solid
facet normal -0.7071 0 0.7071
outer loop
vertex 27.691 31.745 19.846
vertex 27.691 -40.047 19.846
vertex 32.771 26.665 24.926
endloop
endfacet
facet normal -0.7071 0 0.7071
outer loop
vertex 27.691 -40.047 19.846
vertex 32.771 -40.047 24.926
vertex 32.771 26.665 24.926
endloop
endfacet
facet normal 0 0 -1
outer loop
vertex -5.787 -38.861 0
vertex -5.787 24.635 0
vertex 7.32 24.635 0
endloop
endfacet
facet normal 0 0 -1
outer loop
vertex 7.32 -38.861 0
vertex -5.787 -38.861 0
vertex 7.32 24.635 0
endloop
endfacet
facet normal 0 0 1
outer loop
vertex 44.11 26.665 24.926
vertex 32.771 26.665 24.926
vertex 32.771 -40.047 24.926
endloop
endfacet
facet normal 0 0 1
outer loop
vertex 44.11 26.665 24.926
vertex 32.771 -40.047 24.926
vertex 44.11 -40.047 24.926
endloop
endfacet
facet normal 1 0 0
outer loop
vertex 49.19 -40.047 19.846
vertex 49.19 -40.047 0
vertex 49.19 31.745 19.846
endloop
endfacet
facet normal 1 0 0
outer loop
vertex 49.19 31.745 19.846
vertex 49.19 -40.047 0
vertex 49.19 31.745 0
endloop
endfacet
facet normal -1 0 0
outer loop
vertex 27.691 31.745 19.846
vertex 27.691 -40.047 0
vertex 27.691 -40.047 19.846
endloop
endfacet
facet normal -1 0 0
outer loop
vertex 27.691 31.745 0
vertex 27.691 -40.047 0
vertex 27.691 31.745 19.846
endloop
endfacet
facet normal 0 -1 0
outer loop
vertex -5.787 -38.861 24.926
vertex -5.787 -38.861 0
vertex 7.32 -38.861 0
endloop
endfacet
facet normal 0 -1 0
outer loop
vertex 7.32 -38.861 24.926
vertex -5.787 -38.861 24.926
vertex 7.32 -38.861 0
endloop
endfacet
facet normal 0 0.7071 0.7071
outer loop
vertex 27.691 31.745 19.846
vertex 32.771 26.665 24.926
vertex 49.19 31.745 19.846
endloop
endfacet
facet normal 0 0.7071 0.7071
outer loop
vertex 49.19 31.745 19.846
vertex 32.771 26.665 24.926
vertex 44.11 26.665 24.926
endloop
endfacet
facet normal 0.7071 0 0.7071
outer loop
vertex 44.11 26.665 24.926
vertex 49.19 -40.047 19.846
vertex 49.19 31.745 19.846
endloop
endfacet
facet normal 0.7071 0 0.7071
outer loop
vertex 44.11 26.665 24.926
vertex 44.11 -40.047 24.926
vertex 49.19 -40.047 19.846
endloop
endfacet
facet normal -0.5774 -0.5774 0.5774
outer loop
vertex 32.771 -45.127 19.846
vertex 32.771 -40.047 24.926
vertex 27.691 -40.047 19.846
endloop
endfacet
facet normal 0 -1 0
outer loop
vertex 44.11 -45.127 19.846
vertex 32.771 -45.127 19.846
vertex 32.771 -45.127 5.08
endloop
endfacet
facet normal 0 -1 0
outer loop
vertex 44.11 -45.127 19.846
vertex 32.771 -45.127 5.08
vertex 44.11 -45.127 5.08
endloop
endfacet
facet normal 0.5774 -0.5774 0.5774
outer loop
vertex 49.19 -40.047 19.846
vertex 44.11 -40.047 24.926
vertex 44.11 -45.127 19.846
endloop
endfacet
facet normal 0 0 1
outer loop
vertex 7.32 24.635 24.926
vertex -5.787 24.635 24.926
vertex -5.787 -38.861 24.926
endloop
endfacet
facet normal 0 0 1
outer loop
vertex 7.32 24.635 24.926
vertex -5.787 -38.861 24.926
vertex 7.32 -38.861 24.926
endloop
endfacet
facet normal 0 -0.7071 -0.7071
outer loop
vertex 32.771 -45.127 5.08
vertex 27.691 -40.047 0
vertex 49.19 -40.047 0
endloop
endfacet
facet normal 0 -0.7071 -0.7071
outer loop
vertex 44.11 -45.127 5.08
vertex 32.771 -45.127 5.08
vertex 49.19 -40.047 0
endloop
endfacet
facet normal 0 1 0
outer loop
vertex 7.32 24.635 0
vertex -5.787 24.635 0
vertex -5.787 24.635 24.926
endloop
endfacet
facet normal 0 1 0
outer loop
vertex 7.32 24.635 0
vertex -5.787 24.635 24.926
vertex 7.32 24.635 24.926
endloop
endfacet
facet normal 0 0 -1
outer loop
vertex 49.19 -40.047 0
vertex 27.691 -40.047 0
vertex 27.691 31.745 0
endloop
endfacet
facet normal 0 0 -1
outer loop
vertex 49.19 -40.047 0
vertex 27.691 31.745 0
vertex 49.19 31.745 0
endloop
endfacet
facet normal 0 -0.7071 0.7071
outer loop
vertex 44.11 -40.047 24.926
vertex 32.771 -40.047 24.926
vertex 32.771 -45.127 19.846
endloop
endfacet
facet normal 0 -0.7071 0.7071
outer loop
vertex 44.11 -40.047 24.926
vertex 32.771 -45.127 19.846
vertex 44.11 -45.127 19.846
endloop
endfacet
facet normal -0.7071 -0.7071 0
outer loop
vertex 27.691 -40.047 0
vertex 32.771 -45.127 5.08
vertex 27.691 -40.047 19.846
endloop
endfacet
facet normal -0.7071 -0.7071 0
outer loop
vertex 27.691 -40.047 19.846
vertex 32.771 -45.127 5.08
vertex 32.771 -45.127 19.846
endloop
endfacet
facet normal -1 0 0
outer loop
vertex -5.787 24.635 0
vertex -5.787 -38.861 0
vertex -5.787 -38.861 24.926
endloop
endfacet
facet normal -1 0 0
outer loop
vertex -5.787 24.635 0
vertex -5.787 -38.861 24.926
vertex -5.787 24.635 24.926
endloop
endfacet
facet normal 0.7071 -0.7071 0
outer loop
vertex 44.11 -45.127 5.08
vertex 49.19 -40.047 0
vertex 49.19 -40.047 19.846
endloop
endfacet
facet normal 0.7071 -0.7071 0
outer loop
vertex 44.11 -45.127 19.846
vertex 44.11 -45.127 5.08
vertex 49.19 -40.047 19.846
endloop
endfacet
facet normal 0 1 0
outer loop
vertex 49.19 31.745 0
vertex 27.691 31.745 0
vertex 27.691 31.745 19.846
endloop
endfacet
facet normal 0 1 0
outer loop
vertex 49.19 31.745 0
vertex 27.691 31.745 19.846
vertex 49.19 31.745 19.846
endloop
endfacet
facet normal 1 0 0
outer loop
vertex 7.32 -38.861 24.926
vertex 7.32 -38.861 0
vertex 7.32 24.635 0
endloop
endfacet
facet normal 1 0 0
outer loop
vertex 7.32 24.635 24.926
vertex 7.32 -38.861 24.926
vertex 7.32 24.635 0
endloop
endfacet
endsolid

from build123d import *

# Parameters (mm, degrees)
F0_W     = 13.107435
F0_H     = 63.49616
F0_W_2   = 21.499444
F0_H_2   = 76.872785
F1_DEPTH = 24.92603
F2_SIZE  = 5.08


with BuildPart() as f1:
    # F0 (on Top) → F1 (new body)
    with BuildSketch(Plane.XY):
        with Locations((0.766701, -7.113411)):
            Rectangle(F0_W, F0_H)
        with Locations((38.440557, -6.691096)):
            Rectangle(F0_W_2, F0_H_2)
    extrude(amount=F1_DEPTH)

    # F2
    f2_edges = [f1.edges().sort_by_distance(p)[0] for p in [
        (49.190279, -6.691096, 24.92603),
        (38.440557, 31.745296, 24.92603),
        (27.690835, -6.691096, 24.92603),
        (38.440557, -45.127489, 24.92603),
        (27.690835, -45.127489, 12.463015),
        (49.190279, -45.127489, 12.463015),
        (38.440557, -45.127489, 0),
    ]]
    chamfer(f2_edges, length=F2_SIZE)


solid = f1.part
